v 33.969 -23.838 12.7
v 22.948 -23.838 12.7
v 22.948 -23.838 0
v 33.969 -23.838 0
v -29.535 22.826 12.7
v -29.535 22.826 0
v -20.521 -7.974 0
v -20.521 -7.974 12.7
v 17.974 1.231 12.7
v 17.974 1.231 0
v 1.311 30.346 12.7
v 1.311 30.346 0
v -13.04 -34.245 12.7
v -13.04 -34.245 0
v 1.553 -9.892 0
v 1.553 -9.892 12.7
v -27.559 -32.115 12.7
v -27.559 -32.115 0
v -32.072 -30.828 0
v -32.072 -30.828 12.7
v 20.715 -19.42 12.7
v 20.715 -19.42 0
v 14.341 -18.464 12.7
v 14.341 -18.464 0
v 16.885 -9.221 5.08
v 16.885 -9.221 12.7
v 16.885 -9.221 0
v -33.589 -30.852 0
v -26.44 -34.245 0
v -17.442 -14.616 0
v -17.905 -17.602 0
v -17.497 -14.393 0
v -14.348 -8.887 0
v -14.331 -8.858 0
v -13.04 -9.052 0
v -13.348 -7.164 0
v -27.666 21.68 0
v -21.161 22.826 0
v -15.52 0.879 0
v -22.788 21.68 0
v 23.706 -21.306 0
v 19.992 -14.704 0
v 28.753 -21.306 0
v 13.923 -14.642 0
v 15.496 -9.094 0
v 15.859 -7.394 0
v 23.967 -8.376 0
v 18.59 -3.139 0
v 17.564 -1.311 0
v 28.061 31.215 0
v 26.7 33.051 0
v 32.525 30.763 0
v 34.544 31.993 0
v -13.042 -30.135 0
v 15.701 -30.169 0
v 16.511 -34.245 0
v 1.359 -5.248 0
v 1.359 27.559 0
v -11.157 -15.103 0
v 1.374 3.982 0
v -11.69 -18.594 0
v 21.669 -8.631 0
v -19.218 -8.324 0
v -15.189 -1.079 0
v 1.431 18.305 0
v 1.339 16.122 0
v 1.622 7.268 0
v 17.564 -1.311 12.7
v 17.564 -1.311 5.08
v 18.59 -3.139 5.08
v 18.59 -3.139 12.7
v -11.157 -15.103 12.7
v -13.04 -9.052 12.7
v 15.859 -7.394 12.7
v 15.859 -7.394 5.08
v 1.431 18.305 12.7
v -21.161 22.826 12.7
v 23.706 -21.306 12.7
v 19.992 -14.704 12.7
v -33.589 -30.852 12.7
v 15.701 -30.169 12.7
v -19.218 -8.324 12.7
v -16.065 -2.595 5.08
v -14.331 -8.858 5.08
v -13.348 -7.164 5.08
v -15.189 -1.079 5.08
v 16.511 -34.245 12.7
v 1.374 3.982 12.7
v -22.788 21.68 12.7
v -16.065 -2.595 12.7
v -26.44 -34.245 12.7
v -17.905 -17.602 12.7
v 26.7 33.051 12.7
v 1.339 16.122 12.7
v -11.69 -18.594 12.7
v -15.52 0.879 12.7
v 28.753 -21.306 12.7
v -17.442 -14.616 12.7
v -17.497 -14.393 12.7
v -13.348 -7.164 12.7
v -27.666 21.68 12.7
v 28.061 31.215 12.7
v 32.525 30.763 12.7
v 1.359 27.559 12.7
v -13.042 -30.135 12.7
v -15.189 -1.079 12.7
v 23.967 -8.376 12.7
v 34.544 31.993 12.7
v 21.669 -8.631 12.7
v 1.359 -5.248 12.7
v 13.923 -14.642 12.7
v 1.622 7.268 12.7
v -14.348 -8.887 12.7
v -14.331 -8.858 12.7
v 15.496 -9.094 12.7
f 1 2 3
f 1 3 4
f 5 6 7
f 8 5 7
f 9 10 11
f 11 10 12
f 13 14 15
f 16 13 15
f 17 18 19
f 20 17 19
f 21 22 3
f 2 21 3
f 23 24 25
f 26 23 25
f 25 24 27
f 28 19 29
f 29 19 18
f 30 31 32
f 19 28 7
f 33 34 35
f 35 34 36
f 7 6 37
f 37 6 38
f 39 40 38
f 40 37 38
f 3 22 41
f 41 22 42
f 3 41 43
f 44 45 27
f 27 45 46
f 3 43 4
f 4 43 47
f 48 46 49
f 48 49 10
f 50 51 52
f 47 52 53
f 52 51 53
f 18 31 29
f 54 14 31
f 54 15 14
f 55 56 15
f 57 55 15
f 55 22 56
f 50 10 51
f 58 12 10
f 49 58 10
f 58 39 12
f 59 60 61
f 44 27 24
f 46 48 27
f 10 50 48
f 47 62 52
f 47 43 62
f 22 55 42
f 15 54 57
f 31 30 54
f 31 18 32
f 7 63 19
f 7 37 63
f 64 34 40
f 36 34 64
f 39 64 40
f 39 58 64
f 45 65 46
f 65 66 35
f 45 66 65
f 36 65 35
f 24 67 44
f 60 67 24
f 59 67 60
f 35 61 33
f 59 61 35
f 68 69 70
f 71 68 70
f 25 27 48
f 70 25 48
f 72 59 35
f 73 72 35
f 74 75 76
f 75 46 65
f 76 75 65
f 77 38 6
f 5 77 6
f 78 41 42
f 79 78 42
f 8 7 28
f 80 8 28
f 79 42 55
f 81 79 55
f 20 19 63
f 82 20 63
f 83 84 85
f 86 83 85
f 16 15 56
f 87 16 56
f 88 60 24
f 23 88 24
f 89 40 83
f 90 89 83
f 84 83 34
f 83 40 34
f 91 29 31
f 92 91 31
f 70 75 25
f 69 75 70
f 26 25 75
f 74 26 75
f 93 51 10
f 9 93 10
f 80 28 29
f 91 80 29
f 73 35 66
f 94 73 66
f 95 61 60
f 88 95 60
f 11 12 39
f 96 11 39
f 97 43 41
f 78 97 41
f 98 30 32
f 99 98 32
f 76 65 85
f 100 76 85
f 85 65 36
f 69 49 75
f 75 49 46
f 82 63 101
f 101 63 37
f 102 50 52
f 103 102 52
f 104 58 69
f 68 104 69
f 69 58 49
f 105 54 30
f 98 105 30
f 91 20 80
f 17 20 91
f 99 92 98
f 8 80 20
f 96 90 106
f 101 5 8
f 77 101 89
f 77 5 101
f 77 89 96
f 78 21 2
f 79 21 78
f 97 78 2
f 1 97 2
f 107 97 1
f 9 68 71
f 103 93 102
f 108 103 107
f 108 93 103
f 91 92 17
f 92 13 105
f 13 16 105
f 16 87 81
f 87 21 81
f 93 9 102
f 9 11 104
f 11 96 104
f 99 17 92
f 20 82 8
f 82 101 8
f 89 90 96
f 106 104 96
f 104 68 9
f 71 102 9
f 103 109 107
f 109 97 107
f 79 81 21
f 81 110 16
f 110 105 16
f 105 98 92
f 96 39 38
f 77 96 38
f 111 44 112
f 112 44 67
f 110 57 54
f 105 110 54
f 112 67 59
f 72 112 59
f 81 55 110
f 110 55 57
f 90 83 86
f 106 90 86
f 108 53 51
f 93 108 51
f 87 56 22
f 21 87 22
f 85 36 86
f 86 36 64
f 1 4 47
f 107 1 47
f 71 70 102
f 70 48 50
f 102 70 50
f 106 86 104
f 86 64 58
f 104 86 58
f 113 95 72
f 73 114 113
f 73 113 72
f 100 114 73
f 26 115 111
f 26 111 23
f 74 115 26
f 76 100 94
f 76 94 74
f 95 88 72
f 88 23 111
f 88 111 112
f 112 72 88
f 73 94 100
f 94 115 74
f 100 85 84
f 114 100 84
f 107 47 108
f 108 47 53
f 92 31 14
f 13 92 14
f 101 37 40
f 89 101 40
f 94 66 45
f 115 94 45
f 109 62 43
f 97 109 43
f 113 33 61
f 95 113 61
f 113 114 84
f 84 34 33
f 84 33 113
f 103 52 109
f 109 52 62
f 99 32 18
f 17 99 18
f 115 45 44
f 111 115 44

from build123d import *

# Parameters (mm, degrees)
F1_DEPTH = 12.7
F2_DEPTH = 5.08


with BuildPart() as f1:
    # F0 (on Top) → F1 (new body)
    with BuildSketch(Plane.XY):
        Polygon((-20.5210409951, -7.9736062909), (-33.5891470313, -30.8521799743), (-26.4399256557, -34.2453196645), (-17.9045014083, -17.60189794), (-13.0402278155, -34.2453196645), (1.5525938943, -9.8924823105), (16.5106914937, -34.2453196645), (20.7147076726, -19.4195080549), (22.9475684464, -23.8377209753), (33.9693464339, -23.8377209753), (23.9674728364, -8.3760125563), (34.5444940031, 31.9929458201), (26.6998670995, 33.0506488681), (17.9738253355, 1.2314473279), (1.3111314686, 30.3455736883), (-15.5200697482, 0.8788800333), (-21.1611483246, 22.8261984885), (-29.5346230268, 22.8261984885), align=None)
        Polygon((-27.5588259101, -32.1146920323), (-32.0720225573, -30.8284889907), (-19.2177128047, -8.3242123947), (-27.6659652591, 21.6798372567), (-22.7880645543, 21.6798372567), (-16.0654503852, -2.5953715667), (-15.1892008377, -1.078940688), (1.3588338625, 27.5589637458), (17.5643963544, -1.3110835766), (18.5902547091, -3.1386399642), (28.0608907342, 31.214652583), (32.5249694288, 30.7627916336), (21.6690897942, -8.6306408048), (28.7532173097, -21.3059335947), (23.7063355744, -21.3059335947), (19.992057234, -14.7041222081), (15.7005265355, -30.1691573113), (1.3588338625, -5.2477028221), (-13.042463921, -30.1347691566), (-17.4419488758, -14.6160917357), (-17.4973364919, -14.3933231011), align=None, mode=Mode.SUBTRACT)
    extrude(amount=F1_DEPTH)



with BuildPart() as f1b:
    # F0 (on Top) → F1, piece 2 (new body)
    with BuildSketch(Plane.XY):
        Polygon((-13.348367419, -7.1639683075), (-14.3312010466, -8.8577069897), (-14.3479155377, -8.8865114376), (-11.6898040163, -18.593637318), (1.3742336305, 3.9824927226), (14.3406316638, -18.4643995017), (16.8852303177, -9.2208087444), (15.8592973644, -7.3935184654), (1.4307427919, 18.3051954955), align=None)
        Polygon((-11.1567043809, -15.1034206777), (-13.0402278155, -9.0519273654), (1.3387252224, 16.1215702828), (15.4962225923, -9.0943634049), (13.9230203858, -14.6423914203), (1.6215687562, 7.2677372167), align=None, mode=Mode.SUBTRACT)
    extrude(amount=F1_DEPTH)


with BuildPart() as f1_1:
    add(f1.part)

    add(f1b.part)  # F2 merges F1b
    # F0 (on Top) → F2 (join)
    with BuildSketch(Plane.XY):
        Polygon((-15.1892008377, -1.078940688), (-16.0654503852, -2.5953715667), (-14.3312010466, -8.8577069897), (-13.348367419, -7.1639683075), align=None)
        Polygon((18.5902547091, -3.1386399642), (17.5643963544, -1.3110835766), (15.8592973644, -7.3935184654), (16.8852303177, -9.2208087444), align=None)
    extrude(amount=F2_DEPTH)


solid = f1_1.part
